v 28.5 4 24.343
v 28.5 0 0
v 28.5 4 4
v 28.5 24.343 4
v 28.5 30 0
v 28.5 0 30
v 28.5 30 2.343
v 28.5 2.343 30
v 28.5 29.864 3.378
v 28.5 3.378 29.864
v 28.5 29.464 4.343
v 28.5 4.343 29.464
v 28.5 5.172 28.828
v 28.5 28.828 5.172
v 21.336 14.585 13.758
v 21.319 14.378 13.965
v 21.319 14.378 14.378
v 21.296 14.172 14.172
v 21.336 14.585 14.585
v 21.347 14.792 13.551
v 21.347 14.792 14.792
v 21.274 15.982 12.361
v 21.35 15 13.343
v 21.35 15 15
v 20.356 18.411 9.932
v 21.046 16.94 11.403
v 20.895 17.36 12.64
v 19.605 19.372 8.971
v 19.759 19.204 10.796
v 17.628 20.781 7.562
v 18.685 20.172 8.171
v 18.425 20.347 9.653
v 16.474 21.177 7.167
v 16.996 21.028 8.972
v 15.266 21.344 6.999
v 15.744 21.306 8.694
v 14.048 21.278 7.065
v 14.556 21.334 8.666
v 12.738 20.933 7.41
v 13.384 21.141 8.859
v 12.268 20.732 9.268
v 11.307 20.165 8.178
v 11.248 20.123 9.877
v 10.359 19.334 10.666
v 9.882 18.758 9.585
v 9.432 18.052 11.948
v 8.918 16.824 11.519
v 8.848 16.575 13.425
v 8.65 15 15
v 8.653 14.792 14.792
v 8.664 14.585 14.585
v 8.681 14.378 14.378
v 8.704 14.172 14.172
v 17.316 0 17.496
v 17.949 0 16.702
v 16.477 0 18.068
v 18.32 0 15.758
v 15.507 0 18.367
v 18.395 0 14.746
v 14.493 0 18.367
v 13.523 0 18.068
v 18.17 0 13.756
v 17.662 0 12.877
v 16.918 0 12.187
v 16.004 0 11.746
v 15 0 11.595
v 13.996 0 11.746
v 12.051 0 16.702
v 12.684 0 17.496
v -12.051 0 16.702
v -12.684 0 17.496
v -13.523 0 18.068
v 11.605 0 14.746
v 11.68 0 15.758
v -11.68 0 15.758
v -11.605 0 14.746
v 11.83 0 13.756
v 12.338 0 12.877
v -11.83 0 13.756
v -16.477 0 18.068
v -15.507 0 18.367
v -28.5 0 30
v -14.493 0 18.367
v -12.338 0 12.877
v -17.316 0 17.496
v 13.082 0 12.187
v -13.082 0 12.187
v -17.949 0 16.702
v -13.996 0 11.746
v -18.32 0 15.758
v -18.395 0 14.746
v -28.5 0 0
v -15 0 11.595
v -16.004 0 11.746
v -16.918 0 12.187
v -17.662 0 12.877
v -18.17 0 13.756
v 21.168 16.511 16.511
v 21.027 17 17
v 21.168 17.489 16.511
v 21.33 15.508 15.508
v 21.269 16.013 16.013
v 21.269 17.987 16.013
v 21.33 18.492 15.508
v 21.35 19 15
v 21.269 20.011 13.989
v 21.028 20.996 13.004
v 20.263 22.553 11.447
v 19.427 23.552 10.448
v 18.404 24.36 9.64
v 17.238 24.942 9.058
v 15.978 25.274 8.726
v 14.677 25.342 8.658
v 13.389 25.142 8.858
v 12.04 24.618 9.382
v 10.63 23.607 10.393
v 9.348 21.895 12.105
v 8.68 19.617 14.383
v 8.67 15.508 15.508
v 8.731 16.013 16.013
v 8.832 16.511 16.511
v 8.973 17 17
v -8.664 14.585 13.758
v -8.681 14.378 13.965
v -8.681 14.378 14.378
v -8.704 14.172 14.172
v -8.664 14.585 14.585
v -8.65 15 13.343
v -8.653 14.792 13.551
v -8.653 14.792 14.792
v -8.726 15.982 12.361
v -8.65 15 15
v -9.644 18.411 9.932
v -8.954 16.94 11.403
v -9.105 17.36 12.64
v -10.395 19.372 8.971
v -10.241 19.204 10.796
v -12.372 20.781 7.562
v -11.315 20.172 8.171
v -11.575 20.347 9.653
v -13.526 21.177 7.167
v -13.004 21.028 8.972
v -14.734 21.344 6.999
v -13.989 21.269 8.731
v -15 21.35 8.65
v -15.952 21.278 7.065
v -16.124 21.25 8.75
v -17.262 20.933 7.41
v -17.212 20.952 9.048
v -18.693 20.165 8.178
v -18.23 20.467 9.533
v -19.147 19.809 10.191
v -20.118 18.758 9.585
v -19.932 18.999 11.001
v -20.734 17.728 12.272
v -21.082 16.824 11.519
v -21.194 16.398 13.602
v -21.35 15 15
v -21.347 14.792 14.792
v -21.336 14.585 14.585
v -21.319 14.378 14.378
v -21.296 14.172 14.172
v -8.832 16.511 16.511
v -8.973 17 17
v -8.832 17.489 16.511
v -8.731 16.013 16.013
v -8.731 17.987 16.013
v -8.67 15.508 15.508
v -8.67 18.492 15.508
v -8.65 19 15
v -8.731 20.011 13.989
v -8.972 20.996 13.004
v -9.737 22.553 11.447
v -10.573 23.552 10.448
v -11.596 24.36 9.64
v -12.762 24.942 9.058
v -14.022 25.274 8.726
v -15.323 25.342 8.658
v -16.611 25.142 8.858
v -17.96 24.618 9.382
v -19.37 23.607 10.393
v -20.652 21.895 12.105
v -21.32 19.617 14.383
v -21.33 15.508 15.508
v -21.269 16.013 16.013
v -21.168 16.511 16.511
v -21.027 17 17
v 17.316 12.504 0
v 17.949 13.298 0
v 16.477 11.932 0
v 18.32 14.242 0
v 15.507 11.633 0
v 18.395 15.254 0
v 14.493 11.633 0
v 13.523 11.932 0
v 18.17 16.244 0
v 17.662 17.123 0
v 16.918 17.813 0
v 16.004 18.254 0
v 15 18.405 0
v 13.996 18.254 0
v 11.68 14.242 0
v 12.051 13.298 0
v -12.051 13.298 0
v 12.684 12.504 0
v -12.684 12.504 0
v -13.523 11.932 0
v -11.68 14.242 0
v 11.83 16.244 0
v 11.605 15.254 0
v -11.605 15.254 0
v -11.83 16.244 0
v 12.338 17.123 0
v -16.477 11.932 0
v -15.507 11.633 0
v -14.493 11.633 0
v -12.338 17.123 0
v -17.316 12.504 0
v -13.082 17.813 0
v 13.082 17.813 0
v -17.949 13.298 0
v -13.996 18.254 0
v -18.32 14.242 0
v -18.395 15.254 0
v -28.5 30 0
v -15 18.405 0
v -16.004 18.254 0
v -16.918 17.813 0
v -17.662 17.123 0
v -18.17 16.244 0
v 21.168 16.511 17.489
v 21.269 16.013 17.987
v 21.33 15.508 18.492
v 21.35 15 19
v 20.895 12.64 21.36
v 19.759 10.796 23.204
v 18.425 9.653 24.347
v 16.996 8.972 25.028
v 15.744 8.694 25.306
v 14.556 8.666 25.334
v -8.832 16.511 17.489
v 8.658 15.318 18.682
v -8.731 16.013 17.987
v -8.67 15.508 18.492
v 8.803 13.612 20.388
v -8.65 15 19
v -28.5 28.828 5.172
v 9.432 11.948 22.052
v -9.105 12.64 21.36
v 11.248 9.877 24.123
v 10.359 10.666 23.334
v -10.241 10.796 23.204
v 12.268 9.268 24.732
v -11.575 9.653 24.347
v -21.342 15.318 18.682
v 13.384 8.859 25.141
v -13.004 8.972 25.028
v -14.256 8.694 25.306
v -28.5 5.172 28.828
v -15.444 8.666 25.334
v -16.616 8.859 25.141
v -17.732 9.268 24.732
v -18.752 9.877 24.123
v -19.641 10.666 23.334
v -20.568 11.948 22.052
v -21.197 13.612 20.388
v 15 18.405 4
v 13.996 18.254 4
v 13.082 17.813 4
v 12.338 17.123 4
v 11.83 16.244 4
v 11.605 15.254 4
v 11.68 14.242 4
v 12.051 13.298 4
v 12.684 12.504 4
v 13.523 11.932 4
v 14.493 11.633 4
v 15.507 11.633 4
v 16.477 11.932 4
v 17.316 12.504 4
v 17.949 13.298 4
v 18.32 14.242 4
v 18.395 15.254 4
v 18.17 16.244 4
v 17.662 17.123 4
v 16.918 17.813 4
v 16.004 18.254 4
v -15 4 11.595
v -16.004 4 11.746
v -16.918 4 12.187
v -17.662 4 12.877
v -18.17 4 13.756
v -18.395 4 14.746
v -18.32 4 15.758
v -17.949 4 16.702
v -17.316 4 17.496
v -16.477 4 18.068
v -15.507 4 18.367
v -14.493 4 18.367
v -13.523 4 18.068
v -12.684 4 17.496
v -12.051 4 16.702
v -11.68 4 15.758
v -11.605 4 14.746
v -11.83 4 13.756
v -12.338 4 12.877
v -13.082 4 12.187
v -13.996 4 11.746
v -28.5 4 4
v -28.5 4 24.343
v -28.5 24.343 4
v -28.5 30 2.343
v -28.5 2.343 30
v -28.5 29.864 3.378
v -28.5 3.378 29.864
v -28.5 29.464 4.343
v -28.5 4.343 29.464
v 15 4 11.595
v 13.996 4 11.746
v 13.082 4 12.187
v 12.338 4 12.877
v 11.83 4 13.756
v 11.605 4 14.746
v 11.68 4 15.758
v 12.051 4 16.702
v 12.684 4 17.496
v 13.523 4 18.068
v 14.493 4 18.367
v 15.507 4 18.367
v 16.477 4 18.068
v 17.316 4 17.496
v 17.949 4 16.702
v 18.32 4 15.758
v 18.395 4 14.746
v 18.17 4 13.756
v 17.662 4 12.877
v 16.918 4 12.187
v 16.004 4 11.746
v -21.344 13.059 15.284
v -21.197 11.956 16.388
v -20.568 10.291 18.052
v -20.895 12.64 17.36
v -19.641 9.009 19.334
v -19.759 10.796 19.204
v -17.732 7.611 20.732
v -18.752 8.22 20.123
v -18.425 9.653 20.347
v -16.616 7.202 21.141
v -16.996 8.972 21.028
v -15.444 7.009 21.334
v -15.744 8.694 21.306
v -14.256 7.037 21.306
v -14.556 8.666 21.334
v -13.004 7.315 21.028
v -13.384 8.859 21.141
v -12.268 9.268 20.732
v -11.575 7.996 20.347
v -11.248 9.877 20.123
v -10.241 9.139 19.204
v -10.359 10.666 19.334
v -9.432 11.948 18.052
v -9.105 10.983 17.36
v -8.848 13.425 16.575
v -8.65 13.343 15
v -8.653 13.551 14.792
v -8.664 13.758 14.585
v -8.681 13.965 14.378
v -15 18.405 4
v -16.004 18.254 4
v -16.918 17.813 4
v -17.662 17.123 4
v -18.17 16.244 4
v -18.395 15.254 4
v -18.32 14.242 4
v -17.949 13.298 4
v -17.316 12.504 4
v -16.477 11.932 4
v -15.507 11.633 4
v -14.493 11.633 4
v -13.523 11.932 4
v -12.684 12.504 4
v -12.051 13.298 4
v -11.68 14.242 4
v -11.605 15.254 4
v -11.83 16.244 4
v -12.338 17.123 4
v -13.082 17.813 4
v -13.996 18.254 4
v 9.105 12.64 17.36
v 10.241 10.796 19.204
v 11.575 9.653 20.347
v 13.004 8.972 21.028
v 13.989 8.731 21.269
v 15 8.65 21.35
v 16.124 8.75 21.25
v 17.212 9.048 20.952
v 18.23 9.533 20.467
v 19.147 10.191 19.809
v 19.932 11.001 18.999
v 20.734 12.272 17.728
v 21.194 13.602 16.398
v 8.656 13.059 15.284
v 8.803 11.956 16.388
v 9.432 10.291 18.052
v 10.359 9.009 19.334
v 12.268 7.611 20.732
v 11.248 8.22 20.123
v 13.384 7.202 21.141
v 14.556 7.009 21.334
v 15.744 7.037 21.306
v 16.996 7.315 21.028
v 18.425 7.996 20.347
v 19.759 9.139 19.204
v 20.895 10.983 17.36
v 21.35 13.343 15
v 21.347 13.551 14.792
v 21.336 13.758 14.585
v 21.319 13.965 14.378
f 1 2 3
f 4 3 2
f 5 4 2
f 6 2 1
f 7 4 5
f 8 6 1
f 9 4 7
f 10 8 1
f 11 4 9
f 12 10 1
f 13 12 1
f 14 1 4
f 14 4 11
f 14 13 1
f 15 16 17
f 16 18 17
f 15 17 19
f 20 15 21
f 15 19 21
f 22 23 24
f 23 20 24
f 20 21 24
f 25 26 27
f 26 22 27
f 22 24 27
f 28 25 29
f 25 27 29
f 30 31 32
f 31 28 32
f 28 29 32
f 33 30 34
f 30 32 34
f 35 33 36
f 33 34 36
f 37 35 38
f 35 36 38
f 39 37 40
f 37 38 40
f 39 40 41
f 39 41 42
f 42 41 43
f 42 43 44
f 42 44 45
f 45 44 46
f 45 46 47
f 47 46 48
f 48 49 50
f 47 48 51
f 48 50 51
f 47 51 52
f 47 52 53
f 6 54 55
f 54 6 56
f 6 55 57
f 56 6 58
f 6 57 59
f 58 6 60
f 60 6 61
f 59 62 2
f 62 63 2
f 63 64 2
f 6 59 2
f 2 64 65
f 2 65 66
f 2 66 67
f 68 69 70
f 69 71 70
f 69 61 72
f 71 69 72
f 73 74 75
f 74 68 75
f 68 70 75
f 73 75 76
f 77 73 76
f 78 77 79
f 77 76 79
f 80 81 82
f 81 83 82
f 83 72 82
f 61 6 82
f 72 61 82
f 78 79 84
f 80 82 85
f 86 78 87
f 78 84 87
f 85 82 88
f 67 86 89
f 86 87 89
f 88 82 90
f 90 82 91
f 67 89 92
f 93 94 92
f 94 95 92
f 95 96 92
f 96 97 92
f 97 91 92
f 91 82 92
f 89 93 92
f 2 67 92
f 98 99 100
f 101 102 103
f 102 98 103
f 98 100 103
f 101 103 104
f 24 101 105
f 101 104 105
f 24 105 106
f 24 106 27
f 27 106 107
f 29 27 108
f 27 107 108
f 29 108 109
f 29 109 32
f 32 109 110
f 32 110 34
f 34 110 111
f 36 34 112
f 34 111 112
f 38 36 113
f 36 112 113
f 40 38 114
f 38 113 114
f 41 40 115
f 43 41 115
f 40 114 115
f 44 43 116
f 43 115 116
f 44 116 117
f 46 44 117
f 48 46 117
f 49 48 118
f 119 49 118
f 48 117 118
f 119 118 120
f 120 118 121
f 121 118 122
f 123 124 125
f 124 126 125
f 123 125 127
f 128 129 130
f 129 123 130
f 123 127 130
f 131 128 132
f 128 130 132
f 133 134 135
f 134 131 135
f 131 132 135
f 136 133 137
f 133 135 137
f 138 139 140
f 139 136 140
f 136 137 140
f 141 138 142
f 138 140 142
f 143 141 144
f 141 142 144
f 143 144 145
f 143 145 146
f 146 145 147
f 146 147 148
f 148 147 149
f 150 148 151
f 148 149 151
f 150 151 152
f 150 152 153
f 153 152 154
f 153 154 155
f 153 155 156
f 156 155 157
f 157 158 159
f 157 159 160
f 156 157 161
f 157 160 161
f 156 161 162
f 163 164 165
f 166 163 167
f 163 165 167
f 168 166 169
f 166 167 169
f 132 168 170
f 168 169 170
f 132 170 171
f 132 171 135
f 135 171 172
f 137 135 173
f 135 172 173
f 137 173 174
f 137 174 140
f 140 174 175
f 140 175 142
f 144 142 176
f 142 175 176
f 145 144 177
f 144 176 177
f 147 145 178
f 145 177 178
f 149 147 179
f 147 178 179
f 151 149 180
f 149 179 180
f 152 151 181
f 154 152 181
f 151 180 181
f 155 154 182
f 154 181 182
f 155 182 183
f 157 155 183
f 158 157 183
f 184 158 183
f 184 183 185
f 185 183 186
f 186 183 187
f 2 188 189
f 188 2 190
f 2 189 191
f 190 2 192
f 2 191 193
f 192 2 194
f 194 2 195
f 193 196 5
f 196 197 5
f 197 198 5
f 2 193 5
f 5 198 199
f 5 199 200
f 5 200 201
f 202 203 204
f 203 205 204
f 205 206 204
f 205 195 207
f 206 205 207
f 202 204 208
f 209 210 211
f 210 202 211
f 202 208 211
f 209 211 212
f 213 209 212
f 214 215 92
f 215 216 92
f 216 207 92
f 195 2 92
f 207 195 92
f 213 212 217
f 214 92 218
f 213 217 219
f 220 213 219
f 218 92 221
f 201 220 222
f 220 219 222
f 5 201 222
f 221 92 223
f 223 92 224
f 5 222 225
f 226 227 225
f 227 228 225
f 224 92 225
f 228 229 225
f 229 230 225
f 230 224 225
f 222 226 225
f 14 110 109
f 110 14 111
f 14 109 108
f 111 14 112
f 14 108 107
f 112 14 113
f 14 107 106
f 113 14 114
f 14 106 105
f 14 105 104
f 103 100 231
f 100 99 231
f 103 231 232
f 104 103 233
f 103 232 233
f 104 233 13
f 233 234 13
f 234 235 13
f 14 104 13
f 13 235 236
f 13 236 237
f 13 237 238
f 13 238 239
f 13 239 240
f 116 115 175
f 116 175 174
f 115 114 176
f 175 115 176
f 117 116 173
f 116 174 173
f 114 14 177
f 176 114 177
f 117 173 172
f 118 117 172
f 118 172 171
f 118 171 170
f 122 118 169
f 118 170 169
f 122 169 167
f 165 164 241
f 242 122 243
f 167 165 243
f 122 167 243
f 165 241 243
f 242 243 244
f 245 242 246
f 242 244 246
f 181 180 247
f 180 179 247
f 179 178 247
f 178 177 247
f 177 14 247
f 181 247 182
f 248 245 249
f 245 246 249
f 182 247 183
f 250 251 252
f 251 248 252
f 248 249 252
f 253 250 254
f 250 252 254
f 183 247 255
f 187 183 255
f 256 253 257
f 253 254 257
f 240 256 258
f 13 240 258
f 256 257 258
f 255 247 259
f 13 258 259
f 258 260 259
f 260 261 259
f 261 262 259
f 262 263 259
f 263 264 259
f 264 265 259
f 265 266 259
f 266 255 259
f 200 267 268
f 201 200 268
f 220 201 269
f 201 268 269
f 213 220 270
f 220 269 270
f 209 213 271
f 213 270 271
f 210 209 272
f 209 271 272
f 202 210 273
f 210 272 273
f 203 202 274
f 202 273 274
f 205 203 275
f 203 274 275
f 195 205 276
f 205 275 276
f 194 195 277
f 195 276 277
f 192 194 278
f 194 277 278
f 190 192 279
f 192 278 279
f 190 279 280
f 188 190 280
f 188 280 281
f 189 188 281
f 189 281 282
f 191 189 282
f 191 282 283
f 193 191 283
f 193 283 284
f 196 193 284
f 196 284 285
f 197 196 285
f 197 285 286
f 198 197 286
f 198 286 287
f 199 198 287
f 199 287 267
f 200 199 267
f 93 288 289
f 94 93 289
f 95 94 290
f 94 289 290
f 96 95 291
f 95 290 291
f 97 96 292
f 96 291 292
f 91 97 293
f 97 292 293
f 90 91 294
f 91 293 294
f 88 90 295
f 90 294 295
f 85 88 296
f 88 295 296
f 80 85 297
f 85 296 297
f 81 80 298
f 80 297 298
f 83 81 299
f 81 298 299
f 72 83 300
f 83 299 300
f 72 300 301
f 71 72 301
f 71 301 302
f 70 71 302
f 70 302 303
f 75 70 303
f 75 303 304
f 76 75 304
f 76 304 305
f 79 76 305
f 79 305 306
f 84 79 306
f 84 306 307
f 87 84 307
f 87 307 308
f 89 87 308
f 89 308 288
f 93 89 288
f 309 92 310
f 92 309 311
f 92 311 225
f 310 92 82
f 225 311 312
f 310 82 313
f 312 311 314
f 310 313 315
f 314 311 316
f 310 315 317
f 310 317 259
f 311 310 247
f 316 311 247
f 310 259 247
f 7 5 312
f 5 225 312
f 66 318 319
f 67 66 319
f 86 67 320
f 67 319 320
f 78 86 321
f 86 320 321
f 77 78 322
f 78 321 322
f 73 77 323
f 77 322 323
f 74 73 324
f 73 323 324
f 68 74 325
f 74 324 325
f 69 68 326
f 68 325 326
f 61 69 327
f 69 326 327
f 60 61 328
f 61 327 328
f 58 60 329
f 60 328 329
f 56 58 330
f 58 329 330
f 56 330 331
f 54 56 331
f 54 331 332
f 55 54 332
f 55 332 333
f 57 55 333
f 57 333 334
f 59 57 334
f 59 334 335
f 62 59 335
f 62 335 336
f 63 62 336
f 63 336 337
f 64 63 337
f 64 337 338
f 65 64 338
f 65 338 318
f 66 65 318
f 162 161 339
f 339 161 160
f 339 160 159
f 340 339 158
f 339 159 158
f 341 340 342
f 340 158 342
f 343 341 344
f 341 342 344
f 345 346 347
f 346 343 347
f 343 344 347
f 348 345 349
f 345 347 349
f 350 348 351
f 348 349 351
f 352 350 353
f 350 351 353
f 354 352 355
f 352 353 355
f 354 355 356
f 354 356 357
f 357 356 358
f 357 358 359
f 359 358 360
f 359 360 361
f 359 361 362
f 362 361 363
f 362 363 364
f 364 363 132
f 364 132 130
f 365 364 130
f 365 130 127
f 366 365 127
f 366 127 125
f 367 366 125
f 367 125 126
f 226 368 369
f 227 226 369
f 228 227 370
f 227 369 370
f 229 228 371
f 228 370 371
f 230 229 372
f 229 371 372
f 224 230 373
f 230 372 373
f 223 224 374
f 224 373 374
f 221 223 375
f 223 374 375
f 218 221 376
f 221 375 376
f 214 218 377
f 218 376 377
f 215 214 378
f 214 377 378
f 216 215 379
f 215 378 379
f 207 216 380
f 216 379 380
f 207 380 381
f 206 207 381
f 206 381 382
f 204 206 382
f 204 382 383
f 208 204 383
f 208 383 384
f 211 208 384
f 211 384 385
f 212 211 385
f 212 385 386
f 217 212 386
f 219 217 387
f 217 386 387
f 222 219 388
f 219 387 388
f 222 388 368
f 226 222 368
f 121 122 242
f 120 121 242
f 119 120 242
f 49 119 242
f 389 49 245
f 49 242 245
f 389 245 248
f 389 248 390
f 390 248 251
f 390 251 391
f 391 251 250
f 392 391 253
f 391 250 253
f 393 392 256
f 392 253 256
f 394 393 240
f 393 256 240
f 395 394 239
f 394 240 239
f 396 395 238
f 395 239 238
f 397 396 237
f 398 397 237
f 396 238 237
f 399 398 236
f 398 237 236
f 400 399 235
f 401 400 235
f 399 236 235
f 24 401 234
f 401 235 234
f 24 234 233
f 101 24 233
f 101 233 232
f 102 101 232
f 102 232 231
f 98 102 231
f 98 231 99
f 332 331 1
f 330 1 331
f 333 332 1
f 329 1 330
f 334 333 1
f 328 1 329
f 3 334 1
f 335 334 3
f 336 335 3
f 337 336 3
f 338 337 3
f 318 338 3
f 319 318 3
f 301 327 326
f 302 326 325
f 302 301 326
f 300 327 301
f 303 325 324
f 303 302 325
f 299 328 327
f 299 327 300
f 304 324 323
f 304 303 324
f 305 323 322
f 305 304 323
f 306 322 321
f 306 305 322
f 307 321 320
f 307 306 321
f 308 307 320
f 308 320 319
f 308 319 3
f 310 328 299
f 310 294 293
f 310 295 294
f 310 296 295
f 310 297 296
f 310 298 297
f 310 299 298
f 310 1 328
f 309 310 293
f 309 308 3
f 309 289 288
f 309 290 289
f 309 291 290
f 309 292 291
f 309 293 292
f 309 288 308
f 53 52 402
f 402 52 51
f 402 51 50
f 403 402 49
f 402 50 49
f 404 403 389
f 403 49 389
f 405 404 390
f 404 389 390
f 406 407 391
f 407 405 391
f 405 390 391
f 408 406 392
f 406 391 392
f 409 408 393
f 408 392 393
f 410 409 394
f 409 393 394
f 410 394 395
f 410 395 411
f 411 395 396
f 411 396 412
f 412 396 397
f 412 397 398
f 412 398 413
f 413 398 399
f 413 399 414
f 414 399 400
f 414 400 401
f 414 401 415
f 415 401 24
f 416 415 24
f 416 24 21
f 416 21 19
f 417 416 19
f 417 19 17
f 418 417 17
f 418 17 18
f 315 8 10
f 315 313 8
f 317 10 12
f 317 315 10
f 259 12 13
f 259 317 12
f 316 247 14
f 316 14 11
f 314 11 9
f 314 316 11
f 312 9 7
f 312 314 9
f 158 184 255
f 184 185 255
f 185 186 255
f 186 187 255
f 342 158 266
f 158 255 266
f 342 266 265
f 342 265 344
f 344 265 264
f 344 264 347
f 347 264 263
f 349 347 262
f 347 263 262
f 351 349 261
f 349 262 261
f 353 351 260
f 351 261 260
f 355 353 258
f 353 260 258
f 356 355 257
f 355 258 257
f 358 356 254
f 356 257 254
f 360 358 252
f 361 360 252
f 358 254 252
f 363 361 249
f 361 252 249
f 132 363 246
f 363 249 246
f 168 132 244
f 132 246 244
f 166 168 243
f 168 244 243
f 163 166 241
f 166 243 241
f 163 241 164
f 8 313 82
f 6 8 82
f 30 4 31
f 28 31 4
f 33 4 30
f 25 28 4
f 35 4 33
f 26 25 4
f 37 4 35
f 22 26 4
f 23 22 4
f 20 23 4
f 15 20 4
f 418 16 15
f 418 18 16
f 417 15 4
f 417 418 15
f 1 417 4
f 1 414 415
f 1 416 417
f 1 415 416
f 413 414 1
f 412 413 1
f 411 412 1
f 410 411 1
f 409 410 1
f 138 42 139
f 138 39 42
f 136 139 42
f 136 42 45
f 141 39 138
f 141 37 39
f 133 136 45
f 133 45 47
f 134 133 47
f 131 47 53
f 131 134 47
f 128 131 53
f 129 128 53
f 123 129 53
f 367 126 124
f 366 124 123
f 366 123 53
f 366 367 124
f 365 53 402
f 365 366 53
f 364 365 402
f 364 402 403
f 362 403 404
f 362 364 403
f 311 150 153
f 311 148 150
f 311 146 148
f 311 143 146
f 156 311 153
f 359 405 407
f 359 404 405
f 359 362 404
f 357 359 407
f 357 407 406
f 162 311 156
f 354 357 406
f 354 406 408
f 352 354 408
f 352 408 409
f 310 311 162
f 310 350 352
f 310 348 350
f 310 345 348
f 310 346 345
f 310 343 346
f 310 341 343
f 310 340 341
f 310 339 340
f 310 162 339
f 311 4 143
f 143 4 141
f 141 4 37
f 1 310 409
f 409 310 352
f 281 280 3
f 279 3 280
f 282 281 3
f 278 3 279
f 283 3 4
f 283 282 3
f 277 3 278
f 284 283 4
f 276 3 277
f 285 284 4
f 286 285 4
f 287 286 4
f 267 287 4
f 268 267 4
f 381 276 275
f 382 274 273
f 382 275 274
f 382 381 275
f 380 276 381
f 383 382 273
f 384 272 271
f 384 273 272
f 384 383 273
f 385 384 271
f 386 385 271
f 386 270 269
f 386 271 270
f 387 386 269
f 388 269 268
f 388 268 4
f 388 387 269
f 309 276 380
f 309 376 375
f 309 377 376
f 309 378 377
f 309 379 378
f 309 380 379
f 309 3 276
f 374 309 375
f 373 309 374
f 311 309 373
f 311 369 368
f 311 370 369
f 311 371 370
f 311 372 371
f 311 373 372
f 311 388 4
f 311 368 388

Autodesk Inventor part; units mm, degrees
ref_plane "YZ Plane" through (0, 0, 0) normal (1, 0, 0) x (0, 1, 0)
ref_plane "XZ Plane" through (0, 0, 0) normal (0, 1, 0) x (-1, 0, 0)
ref_plane "XY Plane" through (0, 0, 0) normal (0, 0, 1) x (1, 0, 0)
sketch "Sketch_1" plane through (0, 0, 0) normal (1, 0, 0) x (0, 1, 0)
  line L0 (2.3431, 30) -> (0, 30)
  line L1 (0, 30) -> (0, 0)
  line L2 (0, 0) -> (30, 0)
  line L3 (30, 0) -> (30, 2.3431)
  arc A0 (30, 2.3431) -> (28.8284, 5.1716) centre (26, 2.3431) ccw
  line L4 (28.8284, 5.1716) -> (5.1716, 28.8284)
  arc A1 (5.1716, 28.8284) -> (2.3431, 30) centre (2.3431, 26) ccw
  line L5 (4, 24.3431) -> (4, 4)
  line L6 (4, 4) -> (24.3431, 4)
  line L7 (24.3431, 4) -> (4, 24.3431)
extrude "Extrusion1" add sketch "Sketch_1" along normal mid plane 57
sketch "Sketch2" plane through (-28.5, 0, 0) normal (0, -1, 0) x (1, 0, 0)
  point P0 (43.5, 15)
hole "Hole1" at (15, 0, 15) direction (0, 1, 0) diameter 6.81 depth 4
sketch "Sketch3" plane through (28.5, 30, 0) normal (0, 0, -1) x (-1, 0, 0)
  point P0 (13.5, -15)
hole "Hole2" at (15, 15, 0) direction (0, 0, 1) diameter 6.81 depth 4
sketch "Sketch_4" plane through (0, 0, 30) normal (0, 0, 1) x (1, 0, 0)
  circle A0 centre (15, 15) radius 6.35
extrude "Extrusion2" cut sketch "Sketch_4" against normal blind 26
sketch "Sketch_5" plane through (0, 30, 0) normal (0, 1, 0) x (1, 0, 0)
  circle A0 centre (15, -15) radius 6.35
extrude "Extrusion3" cut sketch "Sketch_5" against normal blind 26
sketch "Sketch6" plane through (28.5, 30, 0) normal (0, 0, -1) x (-1, 0, 0)
  point P0 (43.5, -15)
hole "Hole3" at (-15, 15, 0) direction (0, 0, 1) diameter 6.81 depth 4
sketch "Sketch7" plane through (-28.5, 0, 0) normal (0, -1, 0) x (1, 0, 0)
  point P0 (13.5, 15)
hole "Hole4" at (-15, 0, 15) direction (0, 1, 0) diameter 6.81 depth 4
sketch "Sketch_8" plane through (0, 30, 0) normal (0, 1, 0) x (1, 0, 0)
  circle A0 centre (-15, -15) radius 6.35
extrude "Extrusion4" cut sketch "Sketch_8" against normal blind 26
sketch "Sketch_9" plane through (0, 0, 30) normal (0, 0, 1) x (1, 0, 0)
  circle A0 centre (-15, 15) radius 6.35
extrude "Extrusion5" cut sketch "Sketch_9" against normal blind 26
properties part number "30-4134 Aluminum"
